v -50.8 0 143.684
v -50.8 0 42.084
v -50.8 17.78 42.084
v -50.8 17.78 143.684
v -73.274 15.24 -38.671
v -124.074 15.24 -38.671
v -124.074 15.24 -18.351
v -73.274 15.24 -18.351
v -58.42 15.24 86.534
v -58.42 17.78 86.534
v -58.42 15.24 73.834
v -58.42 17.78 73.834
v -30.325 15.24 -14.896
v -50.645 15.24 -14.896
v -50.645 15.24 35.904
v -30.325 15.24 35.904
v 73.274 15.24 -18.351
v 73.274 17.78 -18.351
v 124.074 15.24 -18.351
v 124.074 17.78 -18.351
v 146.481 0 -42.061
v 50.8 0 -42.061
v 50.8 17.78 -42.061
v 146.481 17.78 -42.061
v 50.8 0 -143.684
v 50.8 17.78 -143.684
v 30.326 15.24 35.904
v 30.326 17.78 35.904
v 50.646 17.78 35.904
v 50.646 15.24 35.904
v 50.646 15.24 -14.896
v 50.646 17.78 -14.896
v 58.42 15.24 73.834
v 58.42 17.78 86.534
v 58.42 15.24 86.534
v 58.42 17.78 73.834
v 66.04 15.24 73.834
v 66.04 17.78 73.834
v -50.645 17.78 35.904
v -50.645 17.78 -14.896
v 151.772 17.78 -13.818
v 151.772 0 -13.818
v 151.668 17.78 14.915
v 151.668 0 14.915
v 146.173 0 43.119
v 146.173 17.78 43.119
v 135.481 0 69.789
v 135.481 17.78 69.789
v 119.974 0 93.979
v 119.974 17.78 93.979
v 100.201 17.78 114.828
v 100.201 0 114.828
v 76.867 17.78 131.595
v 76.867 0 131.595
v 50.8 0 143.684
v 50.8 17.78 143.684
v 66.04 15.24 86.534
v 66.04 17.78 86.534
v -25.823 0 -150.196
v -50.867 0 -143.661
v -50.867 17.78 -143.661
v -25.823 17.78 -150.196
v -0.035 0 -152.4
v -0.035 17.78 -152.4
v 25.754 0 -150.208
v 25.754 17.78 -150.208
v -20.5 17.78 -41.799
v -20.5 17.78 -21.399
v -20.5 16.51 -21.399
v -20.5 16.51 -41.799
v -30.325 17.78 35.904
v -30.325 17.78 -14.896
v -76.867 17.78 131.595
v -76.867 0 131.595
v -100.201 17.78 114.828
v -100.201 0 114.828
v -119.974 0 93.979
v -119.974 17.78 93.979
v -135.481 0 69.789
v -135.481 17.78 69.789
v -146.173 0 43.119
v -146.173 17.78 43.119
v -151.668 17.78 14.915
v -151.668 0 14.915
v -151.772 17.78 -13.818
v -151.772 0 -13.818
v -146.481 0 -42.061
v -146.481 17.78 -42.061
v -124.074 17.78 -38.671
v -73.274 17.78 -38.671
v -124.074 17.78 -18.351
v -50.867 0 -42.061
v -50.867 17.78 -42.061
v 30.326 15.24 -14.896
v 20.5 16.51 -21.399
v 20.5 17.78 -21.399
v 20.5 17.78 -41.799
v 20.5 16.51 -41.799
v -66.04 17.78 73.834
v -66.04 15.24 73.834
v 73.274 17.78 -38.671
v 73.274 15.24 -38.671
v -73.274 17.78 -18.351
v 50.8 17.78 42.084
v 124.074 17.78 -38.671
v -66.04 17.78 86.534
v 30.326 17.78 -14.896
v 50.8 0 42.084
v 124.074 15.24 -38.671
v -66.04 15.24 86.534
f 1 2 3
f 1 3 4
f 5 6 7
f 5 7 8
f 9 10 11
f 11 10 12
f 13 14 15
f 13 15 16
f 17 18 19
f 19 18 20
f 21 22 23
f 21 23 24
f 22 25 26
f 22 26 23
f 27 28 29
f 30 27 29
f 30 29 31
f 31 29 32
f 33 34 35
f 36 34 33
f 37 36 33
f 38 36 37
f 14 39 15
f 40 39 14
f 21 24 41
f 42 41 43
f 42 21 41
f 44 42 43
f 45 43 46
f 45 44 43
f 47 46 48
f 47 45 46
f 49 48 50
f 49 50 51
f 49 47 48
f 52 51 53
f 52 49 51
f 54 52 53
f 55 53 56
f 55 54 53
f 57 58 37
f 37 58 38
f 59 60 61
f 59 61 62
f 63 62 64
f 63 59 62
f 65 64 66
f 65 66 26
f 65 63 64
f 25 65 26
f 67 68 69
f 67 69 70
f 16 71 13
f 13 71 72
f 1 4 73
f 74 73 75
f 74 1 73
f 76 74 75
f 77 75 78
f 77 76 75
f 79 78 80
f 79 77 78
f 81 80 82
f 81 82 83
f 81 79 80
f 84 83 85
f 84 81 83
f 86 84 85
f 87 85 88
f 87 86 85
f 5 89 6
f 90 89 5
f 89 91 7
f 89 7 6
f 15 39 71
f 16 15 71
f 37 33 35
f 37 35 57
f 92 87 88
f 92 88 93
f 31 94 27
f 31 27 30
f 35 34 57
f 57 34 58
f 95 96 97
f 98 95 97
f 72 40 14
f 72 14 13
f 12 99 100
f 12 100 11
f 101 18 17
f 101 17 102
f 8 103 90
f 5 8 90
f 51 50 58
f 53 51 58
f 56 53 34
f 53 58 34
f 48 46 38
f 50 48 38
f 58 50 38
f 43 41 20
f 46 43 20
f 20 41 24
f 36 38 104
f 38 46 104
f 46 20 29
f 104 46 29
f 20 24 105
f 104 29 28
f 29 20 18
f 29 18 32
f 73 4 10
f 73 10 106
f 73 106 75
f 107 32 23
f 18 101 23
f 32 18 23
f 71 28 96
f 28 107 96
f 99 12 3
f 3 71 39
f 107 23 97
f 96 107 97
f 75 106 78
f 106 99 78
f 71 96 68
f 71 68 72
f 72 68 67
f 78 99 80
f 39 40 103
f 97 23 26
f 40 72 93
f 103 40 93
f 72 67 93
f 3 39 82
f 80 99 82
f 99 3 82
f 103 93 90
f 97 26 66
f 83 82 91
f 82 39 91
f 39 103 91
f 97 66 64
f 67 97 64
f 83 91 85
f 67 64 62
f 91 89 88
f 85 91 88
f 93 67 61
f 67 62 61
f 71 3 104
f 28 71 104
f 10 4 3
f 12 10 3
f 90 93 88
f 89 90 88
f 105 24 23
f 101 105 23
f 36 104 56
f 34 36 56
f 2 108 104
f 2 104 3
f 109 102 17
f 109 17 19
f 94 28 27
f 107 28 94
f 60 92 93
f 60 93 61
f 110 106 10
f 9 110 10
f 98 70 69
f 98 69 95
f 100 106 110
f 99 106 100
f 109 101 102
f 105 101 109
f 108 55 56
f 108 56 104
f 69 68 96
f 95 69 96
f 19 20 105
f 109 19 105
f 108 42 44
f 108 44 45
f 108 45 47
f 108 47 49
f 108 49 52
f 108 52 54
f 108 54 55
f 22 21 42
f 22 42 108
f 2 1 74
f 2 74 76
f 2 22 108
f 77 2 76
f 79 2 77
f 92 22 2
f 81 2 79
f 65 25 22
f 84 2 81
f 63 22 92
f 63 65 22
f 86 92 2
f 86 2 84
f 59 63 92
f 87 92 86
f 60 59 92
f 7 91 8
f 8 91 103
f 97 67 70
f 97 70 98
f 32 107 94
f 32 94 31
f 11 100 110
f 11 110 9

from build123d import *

# Parameters (mm, degrees)
BOSS_EXTRUDE1_DEPTH = 17.78
SKETCH2_W           = 41
SKETCH2_H           = 20.4
CUT_EXTRUDE1_DEPTH  = 1.27
SKETCH3_W           = 7.62
SKETCH3_H           = 12.7
CUT_EXTRUDE2_DEPTH  = 2.54
SKETCH4_W           = 50.8
SKETCH4_H           = 20.32
SKETCH4_W_2         = 20.32
SKETCH4_H_2         = 50.8
CUT_EXTRUDE3_DEPTH  = 2.54


with BuildPart() as part:
    # Sketch1 → Boss-Extrude1 (new body)
    with BuildSketch(Plane(origin=(0, 0, 0), x_dir=(1, 0, 0), z_dir=(0, 1, 0))):
        with BuildLine():
            Line((50.8, -42.084097937), (-50.8, -42.084097937))
            Line((-50.8, -42.084097937), (-50.8, -143.684097937))
            ThreePointArc((-50.8, -143.684097937), (-135.481402596, -69.789322613), (-146.480963287, 42.060520616))
            Line((-146.480963287, 42.060520616), (-50.866637556, 42.060520616))
            Line((-50.866637556, 42.060520616), (-50.866637556, 143.660520616))
            ThreePointArc((-50.866637556, 143.660520616), (-0.035342799, 152.399995902), (50.8, 143.684097937))
            Line((50.8, 143.684097937), (50.8, 42.060520616))
            Line((50.8, 42.060520616), (146.480963287, 42.060520616))
            ThreePointArc((146.480963287, 42.060520616), (135.481402596, -69.789322613), (50.8, -143.684097937))
            Line((50.8, -143.684097937), (50.8, -42.084097937))
        make_face()
    extrude(amount=BOSS_EXTRUDE1_DEPTH)

    # Sketch2 → Cut-Extrude1 (cut)
    with BuildSketch(Plane(origin=(0, 17.78, 0), x_dir=(1, 0, 0), z_dir=(0, 1, 0))):
        with Locations((0, 31.598605784)):
            Rectangle(SKETCH2_W, SKETCH2_H)
    extrude(amount=-CUT_EXTRUDE1_DEPTH, mode=Mode.SUBTRACT)

    # Sketch3 → Cut-Extrude2 (cut)
    with BuildSketch(Plane(origin=(0, 17.78, 0), x_dir=(1, 0, 0), z_dir=(0, 1, 0))):
        with Locations((-62.23, -80.184097937)):
            Rectangle(SKETCH3_W, SKETCH3_H)
        with Locations((62.23, -80.184097937)):
            Rectangle(SKETCH3_W, SKETCH3_H)
    extrude(amount=-CUT_EXTRUDE2_DEPTH, mode=Mode.SUBTRACT)

    # Sketch4 → Cut-Extrude3 (cut)
    with BuildSketch(Plane(origin=(0, 17.78, 0), x_dir=(1, 0, 0), z_dir=(0, 1, 0))):
        with Locations((-98.673800421, 28.511480762)):
            Rectangle(SKETCH4_W, SKETCH4_H)
        with Locations((98.673800421, 28.511480762)):
            Rectangle(SKETCH4_W, SKETCH4_H)
        with Locations((-40.485390627, -10.503849142)):
            Rectangle(SKETCH4_W_2, SKETCH4_H_2)
        with Locations((40.485644605, -10.503849142)):
            Rectangle(SKETCH4_W_2, SKETCH4_H_2)
    extrude(amount=-CUT_EXTRUDE3_DEPTH, mode=Mode.SUBTRACT)


solid = part.part
